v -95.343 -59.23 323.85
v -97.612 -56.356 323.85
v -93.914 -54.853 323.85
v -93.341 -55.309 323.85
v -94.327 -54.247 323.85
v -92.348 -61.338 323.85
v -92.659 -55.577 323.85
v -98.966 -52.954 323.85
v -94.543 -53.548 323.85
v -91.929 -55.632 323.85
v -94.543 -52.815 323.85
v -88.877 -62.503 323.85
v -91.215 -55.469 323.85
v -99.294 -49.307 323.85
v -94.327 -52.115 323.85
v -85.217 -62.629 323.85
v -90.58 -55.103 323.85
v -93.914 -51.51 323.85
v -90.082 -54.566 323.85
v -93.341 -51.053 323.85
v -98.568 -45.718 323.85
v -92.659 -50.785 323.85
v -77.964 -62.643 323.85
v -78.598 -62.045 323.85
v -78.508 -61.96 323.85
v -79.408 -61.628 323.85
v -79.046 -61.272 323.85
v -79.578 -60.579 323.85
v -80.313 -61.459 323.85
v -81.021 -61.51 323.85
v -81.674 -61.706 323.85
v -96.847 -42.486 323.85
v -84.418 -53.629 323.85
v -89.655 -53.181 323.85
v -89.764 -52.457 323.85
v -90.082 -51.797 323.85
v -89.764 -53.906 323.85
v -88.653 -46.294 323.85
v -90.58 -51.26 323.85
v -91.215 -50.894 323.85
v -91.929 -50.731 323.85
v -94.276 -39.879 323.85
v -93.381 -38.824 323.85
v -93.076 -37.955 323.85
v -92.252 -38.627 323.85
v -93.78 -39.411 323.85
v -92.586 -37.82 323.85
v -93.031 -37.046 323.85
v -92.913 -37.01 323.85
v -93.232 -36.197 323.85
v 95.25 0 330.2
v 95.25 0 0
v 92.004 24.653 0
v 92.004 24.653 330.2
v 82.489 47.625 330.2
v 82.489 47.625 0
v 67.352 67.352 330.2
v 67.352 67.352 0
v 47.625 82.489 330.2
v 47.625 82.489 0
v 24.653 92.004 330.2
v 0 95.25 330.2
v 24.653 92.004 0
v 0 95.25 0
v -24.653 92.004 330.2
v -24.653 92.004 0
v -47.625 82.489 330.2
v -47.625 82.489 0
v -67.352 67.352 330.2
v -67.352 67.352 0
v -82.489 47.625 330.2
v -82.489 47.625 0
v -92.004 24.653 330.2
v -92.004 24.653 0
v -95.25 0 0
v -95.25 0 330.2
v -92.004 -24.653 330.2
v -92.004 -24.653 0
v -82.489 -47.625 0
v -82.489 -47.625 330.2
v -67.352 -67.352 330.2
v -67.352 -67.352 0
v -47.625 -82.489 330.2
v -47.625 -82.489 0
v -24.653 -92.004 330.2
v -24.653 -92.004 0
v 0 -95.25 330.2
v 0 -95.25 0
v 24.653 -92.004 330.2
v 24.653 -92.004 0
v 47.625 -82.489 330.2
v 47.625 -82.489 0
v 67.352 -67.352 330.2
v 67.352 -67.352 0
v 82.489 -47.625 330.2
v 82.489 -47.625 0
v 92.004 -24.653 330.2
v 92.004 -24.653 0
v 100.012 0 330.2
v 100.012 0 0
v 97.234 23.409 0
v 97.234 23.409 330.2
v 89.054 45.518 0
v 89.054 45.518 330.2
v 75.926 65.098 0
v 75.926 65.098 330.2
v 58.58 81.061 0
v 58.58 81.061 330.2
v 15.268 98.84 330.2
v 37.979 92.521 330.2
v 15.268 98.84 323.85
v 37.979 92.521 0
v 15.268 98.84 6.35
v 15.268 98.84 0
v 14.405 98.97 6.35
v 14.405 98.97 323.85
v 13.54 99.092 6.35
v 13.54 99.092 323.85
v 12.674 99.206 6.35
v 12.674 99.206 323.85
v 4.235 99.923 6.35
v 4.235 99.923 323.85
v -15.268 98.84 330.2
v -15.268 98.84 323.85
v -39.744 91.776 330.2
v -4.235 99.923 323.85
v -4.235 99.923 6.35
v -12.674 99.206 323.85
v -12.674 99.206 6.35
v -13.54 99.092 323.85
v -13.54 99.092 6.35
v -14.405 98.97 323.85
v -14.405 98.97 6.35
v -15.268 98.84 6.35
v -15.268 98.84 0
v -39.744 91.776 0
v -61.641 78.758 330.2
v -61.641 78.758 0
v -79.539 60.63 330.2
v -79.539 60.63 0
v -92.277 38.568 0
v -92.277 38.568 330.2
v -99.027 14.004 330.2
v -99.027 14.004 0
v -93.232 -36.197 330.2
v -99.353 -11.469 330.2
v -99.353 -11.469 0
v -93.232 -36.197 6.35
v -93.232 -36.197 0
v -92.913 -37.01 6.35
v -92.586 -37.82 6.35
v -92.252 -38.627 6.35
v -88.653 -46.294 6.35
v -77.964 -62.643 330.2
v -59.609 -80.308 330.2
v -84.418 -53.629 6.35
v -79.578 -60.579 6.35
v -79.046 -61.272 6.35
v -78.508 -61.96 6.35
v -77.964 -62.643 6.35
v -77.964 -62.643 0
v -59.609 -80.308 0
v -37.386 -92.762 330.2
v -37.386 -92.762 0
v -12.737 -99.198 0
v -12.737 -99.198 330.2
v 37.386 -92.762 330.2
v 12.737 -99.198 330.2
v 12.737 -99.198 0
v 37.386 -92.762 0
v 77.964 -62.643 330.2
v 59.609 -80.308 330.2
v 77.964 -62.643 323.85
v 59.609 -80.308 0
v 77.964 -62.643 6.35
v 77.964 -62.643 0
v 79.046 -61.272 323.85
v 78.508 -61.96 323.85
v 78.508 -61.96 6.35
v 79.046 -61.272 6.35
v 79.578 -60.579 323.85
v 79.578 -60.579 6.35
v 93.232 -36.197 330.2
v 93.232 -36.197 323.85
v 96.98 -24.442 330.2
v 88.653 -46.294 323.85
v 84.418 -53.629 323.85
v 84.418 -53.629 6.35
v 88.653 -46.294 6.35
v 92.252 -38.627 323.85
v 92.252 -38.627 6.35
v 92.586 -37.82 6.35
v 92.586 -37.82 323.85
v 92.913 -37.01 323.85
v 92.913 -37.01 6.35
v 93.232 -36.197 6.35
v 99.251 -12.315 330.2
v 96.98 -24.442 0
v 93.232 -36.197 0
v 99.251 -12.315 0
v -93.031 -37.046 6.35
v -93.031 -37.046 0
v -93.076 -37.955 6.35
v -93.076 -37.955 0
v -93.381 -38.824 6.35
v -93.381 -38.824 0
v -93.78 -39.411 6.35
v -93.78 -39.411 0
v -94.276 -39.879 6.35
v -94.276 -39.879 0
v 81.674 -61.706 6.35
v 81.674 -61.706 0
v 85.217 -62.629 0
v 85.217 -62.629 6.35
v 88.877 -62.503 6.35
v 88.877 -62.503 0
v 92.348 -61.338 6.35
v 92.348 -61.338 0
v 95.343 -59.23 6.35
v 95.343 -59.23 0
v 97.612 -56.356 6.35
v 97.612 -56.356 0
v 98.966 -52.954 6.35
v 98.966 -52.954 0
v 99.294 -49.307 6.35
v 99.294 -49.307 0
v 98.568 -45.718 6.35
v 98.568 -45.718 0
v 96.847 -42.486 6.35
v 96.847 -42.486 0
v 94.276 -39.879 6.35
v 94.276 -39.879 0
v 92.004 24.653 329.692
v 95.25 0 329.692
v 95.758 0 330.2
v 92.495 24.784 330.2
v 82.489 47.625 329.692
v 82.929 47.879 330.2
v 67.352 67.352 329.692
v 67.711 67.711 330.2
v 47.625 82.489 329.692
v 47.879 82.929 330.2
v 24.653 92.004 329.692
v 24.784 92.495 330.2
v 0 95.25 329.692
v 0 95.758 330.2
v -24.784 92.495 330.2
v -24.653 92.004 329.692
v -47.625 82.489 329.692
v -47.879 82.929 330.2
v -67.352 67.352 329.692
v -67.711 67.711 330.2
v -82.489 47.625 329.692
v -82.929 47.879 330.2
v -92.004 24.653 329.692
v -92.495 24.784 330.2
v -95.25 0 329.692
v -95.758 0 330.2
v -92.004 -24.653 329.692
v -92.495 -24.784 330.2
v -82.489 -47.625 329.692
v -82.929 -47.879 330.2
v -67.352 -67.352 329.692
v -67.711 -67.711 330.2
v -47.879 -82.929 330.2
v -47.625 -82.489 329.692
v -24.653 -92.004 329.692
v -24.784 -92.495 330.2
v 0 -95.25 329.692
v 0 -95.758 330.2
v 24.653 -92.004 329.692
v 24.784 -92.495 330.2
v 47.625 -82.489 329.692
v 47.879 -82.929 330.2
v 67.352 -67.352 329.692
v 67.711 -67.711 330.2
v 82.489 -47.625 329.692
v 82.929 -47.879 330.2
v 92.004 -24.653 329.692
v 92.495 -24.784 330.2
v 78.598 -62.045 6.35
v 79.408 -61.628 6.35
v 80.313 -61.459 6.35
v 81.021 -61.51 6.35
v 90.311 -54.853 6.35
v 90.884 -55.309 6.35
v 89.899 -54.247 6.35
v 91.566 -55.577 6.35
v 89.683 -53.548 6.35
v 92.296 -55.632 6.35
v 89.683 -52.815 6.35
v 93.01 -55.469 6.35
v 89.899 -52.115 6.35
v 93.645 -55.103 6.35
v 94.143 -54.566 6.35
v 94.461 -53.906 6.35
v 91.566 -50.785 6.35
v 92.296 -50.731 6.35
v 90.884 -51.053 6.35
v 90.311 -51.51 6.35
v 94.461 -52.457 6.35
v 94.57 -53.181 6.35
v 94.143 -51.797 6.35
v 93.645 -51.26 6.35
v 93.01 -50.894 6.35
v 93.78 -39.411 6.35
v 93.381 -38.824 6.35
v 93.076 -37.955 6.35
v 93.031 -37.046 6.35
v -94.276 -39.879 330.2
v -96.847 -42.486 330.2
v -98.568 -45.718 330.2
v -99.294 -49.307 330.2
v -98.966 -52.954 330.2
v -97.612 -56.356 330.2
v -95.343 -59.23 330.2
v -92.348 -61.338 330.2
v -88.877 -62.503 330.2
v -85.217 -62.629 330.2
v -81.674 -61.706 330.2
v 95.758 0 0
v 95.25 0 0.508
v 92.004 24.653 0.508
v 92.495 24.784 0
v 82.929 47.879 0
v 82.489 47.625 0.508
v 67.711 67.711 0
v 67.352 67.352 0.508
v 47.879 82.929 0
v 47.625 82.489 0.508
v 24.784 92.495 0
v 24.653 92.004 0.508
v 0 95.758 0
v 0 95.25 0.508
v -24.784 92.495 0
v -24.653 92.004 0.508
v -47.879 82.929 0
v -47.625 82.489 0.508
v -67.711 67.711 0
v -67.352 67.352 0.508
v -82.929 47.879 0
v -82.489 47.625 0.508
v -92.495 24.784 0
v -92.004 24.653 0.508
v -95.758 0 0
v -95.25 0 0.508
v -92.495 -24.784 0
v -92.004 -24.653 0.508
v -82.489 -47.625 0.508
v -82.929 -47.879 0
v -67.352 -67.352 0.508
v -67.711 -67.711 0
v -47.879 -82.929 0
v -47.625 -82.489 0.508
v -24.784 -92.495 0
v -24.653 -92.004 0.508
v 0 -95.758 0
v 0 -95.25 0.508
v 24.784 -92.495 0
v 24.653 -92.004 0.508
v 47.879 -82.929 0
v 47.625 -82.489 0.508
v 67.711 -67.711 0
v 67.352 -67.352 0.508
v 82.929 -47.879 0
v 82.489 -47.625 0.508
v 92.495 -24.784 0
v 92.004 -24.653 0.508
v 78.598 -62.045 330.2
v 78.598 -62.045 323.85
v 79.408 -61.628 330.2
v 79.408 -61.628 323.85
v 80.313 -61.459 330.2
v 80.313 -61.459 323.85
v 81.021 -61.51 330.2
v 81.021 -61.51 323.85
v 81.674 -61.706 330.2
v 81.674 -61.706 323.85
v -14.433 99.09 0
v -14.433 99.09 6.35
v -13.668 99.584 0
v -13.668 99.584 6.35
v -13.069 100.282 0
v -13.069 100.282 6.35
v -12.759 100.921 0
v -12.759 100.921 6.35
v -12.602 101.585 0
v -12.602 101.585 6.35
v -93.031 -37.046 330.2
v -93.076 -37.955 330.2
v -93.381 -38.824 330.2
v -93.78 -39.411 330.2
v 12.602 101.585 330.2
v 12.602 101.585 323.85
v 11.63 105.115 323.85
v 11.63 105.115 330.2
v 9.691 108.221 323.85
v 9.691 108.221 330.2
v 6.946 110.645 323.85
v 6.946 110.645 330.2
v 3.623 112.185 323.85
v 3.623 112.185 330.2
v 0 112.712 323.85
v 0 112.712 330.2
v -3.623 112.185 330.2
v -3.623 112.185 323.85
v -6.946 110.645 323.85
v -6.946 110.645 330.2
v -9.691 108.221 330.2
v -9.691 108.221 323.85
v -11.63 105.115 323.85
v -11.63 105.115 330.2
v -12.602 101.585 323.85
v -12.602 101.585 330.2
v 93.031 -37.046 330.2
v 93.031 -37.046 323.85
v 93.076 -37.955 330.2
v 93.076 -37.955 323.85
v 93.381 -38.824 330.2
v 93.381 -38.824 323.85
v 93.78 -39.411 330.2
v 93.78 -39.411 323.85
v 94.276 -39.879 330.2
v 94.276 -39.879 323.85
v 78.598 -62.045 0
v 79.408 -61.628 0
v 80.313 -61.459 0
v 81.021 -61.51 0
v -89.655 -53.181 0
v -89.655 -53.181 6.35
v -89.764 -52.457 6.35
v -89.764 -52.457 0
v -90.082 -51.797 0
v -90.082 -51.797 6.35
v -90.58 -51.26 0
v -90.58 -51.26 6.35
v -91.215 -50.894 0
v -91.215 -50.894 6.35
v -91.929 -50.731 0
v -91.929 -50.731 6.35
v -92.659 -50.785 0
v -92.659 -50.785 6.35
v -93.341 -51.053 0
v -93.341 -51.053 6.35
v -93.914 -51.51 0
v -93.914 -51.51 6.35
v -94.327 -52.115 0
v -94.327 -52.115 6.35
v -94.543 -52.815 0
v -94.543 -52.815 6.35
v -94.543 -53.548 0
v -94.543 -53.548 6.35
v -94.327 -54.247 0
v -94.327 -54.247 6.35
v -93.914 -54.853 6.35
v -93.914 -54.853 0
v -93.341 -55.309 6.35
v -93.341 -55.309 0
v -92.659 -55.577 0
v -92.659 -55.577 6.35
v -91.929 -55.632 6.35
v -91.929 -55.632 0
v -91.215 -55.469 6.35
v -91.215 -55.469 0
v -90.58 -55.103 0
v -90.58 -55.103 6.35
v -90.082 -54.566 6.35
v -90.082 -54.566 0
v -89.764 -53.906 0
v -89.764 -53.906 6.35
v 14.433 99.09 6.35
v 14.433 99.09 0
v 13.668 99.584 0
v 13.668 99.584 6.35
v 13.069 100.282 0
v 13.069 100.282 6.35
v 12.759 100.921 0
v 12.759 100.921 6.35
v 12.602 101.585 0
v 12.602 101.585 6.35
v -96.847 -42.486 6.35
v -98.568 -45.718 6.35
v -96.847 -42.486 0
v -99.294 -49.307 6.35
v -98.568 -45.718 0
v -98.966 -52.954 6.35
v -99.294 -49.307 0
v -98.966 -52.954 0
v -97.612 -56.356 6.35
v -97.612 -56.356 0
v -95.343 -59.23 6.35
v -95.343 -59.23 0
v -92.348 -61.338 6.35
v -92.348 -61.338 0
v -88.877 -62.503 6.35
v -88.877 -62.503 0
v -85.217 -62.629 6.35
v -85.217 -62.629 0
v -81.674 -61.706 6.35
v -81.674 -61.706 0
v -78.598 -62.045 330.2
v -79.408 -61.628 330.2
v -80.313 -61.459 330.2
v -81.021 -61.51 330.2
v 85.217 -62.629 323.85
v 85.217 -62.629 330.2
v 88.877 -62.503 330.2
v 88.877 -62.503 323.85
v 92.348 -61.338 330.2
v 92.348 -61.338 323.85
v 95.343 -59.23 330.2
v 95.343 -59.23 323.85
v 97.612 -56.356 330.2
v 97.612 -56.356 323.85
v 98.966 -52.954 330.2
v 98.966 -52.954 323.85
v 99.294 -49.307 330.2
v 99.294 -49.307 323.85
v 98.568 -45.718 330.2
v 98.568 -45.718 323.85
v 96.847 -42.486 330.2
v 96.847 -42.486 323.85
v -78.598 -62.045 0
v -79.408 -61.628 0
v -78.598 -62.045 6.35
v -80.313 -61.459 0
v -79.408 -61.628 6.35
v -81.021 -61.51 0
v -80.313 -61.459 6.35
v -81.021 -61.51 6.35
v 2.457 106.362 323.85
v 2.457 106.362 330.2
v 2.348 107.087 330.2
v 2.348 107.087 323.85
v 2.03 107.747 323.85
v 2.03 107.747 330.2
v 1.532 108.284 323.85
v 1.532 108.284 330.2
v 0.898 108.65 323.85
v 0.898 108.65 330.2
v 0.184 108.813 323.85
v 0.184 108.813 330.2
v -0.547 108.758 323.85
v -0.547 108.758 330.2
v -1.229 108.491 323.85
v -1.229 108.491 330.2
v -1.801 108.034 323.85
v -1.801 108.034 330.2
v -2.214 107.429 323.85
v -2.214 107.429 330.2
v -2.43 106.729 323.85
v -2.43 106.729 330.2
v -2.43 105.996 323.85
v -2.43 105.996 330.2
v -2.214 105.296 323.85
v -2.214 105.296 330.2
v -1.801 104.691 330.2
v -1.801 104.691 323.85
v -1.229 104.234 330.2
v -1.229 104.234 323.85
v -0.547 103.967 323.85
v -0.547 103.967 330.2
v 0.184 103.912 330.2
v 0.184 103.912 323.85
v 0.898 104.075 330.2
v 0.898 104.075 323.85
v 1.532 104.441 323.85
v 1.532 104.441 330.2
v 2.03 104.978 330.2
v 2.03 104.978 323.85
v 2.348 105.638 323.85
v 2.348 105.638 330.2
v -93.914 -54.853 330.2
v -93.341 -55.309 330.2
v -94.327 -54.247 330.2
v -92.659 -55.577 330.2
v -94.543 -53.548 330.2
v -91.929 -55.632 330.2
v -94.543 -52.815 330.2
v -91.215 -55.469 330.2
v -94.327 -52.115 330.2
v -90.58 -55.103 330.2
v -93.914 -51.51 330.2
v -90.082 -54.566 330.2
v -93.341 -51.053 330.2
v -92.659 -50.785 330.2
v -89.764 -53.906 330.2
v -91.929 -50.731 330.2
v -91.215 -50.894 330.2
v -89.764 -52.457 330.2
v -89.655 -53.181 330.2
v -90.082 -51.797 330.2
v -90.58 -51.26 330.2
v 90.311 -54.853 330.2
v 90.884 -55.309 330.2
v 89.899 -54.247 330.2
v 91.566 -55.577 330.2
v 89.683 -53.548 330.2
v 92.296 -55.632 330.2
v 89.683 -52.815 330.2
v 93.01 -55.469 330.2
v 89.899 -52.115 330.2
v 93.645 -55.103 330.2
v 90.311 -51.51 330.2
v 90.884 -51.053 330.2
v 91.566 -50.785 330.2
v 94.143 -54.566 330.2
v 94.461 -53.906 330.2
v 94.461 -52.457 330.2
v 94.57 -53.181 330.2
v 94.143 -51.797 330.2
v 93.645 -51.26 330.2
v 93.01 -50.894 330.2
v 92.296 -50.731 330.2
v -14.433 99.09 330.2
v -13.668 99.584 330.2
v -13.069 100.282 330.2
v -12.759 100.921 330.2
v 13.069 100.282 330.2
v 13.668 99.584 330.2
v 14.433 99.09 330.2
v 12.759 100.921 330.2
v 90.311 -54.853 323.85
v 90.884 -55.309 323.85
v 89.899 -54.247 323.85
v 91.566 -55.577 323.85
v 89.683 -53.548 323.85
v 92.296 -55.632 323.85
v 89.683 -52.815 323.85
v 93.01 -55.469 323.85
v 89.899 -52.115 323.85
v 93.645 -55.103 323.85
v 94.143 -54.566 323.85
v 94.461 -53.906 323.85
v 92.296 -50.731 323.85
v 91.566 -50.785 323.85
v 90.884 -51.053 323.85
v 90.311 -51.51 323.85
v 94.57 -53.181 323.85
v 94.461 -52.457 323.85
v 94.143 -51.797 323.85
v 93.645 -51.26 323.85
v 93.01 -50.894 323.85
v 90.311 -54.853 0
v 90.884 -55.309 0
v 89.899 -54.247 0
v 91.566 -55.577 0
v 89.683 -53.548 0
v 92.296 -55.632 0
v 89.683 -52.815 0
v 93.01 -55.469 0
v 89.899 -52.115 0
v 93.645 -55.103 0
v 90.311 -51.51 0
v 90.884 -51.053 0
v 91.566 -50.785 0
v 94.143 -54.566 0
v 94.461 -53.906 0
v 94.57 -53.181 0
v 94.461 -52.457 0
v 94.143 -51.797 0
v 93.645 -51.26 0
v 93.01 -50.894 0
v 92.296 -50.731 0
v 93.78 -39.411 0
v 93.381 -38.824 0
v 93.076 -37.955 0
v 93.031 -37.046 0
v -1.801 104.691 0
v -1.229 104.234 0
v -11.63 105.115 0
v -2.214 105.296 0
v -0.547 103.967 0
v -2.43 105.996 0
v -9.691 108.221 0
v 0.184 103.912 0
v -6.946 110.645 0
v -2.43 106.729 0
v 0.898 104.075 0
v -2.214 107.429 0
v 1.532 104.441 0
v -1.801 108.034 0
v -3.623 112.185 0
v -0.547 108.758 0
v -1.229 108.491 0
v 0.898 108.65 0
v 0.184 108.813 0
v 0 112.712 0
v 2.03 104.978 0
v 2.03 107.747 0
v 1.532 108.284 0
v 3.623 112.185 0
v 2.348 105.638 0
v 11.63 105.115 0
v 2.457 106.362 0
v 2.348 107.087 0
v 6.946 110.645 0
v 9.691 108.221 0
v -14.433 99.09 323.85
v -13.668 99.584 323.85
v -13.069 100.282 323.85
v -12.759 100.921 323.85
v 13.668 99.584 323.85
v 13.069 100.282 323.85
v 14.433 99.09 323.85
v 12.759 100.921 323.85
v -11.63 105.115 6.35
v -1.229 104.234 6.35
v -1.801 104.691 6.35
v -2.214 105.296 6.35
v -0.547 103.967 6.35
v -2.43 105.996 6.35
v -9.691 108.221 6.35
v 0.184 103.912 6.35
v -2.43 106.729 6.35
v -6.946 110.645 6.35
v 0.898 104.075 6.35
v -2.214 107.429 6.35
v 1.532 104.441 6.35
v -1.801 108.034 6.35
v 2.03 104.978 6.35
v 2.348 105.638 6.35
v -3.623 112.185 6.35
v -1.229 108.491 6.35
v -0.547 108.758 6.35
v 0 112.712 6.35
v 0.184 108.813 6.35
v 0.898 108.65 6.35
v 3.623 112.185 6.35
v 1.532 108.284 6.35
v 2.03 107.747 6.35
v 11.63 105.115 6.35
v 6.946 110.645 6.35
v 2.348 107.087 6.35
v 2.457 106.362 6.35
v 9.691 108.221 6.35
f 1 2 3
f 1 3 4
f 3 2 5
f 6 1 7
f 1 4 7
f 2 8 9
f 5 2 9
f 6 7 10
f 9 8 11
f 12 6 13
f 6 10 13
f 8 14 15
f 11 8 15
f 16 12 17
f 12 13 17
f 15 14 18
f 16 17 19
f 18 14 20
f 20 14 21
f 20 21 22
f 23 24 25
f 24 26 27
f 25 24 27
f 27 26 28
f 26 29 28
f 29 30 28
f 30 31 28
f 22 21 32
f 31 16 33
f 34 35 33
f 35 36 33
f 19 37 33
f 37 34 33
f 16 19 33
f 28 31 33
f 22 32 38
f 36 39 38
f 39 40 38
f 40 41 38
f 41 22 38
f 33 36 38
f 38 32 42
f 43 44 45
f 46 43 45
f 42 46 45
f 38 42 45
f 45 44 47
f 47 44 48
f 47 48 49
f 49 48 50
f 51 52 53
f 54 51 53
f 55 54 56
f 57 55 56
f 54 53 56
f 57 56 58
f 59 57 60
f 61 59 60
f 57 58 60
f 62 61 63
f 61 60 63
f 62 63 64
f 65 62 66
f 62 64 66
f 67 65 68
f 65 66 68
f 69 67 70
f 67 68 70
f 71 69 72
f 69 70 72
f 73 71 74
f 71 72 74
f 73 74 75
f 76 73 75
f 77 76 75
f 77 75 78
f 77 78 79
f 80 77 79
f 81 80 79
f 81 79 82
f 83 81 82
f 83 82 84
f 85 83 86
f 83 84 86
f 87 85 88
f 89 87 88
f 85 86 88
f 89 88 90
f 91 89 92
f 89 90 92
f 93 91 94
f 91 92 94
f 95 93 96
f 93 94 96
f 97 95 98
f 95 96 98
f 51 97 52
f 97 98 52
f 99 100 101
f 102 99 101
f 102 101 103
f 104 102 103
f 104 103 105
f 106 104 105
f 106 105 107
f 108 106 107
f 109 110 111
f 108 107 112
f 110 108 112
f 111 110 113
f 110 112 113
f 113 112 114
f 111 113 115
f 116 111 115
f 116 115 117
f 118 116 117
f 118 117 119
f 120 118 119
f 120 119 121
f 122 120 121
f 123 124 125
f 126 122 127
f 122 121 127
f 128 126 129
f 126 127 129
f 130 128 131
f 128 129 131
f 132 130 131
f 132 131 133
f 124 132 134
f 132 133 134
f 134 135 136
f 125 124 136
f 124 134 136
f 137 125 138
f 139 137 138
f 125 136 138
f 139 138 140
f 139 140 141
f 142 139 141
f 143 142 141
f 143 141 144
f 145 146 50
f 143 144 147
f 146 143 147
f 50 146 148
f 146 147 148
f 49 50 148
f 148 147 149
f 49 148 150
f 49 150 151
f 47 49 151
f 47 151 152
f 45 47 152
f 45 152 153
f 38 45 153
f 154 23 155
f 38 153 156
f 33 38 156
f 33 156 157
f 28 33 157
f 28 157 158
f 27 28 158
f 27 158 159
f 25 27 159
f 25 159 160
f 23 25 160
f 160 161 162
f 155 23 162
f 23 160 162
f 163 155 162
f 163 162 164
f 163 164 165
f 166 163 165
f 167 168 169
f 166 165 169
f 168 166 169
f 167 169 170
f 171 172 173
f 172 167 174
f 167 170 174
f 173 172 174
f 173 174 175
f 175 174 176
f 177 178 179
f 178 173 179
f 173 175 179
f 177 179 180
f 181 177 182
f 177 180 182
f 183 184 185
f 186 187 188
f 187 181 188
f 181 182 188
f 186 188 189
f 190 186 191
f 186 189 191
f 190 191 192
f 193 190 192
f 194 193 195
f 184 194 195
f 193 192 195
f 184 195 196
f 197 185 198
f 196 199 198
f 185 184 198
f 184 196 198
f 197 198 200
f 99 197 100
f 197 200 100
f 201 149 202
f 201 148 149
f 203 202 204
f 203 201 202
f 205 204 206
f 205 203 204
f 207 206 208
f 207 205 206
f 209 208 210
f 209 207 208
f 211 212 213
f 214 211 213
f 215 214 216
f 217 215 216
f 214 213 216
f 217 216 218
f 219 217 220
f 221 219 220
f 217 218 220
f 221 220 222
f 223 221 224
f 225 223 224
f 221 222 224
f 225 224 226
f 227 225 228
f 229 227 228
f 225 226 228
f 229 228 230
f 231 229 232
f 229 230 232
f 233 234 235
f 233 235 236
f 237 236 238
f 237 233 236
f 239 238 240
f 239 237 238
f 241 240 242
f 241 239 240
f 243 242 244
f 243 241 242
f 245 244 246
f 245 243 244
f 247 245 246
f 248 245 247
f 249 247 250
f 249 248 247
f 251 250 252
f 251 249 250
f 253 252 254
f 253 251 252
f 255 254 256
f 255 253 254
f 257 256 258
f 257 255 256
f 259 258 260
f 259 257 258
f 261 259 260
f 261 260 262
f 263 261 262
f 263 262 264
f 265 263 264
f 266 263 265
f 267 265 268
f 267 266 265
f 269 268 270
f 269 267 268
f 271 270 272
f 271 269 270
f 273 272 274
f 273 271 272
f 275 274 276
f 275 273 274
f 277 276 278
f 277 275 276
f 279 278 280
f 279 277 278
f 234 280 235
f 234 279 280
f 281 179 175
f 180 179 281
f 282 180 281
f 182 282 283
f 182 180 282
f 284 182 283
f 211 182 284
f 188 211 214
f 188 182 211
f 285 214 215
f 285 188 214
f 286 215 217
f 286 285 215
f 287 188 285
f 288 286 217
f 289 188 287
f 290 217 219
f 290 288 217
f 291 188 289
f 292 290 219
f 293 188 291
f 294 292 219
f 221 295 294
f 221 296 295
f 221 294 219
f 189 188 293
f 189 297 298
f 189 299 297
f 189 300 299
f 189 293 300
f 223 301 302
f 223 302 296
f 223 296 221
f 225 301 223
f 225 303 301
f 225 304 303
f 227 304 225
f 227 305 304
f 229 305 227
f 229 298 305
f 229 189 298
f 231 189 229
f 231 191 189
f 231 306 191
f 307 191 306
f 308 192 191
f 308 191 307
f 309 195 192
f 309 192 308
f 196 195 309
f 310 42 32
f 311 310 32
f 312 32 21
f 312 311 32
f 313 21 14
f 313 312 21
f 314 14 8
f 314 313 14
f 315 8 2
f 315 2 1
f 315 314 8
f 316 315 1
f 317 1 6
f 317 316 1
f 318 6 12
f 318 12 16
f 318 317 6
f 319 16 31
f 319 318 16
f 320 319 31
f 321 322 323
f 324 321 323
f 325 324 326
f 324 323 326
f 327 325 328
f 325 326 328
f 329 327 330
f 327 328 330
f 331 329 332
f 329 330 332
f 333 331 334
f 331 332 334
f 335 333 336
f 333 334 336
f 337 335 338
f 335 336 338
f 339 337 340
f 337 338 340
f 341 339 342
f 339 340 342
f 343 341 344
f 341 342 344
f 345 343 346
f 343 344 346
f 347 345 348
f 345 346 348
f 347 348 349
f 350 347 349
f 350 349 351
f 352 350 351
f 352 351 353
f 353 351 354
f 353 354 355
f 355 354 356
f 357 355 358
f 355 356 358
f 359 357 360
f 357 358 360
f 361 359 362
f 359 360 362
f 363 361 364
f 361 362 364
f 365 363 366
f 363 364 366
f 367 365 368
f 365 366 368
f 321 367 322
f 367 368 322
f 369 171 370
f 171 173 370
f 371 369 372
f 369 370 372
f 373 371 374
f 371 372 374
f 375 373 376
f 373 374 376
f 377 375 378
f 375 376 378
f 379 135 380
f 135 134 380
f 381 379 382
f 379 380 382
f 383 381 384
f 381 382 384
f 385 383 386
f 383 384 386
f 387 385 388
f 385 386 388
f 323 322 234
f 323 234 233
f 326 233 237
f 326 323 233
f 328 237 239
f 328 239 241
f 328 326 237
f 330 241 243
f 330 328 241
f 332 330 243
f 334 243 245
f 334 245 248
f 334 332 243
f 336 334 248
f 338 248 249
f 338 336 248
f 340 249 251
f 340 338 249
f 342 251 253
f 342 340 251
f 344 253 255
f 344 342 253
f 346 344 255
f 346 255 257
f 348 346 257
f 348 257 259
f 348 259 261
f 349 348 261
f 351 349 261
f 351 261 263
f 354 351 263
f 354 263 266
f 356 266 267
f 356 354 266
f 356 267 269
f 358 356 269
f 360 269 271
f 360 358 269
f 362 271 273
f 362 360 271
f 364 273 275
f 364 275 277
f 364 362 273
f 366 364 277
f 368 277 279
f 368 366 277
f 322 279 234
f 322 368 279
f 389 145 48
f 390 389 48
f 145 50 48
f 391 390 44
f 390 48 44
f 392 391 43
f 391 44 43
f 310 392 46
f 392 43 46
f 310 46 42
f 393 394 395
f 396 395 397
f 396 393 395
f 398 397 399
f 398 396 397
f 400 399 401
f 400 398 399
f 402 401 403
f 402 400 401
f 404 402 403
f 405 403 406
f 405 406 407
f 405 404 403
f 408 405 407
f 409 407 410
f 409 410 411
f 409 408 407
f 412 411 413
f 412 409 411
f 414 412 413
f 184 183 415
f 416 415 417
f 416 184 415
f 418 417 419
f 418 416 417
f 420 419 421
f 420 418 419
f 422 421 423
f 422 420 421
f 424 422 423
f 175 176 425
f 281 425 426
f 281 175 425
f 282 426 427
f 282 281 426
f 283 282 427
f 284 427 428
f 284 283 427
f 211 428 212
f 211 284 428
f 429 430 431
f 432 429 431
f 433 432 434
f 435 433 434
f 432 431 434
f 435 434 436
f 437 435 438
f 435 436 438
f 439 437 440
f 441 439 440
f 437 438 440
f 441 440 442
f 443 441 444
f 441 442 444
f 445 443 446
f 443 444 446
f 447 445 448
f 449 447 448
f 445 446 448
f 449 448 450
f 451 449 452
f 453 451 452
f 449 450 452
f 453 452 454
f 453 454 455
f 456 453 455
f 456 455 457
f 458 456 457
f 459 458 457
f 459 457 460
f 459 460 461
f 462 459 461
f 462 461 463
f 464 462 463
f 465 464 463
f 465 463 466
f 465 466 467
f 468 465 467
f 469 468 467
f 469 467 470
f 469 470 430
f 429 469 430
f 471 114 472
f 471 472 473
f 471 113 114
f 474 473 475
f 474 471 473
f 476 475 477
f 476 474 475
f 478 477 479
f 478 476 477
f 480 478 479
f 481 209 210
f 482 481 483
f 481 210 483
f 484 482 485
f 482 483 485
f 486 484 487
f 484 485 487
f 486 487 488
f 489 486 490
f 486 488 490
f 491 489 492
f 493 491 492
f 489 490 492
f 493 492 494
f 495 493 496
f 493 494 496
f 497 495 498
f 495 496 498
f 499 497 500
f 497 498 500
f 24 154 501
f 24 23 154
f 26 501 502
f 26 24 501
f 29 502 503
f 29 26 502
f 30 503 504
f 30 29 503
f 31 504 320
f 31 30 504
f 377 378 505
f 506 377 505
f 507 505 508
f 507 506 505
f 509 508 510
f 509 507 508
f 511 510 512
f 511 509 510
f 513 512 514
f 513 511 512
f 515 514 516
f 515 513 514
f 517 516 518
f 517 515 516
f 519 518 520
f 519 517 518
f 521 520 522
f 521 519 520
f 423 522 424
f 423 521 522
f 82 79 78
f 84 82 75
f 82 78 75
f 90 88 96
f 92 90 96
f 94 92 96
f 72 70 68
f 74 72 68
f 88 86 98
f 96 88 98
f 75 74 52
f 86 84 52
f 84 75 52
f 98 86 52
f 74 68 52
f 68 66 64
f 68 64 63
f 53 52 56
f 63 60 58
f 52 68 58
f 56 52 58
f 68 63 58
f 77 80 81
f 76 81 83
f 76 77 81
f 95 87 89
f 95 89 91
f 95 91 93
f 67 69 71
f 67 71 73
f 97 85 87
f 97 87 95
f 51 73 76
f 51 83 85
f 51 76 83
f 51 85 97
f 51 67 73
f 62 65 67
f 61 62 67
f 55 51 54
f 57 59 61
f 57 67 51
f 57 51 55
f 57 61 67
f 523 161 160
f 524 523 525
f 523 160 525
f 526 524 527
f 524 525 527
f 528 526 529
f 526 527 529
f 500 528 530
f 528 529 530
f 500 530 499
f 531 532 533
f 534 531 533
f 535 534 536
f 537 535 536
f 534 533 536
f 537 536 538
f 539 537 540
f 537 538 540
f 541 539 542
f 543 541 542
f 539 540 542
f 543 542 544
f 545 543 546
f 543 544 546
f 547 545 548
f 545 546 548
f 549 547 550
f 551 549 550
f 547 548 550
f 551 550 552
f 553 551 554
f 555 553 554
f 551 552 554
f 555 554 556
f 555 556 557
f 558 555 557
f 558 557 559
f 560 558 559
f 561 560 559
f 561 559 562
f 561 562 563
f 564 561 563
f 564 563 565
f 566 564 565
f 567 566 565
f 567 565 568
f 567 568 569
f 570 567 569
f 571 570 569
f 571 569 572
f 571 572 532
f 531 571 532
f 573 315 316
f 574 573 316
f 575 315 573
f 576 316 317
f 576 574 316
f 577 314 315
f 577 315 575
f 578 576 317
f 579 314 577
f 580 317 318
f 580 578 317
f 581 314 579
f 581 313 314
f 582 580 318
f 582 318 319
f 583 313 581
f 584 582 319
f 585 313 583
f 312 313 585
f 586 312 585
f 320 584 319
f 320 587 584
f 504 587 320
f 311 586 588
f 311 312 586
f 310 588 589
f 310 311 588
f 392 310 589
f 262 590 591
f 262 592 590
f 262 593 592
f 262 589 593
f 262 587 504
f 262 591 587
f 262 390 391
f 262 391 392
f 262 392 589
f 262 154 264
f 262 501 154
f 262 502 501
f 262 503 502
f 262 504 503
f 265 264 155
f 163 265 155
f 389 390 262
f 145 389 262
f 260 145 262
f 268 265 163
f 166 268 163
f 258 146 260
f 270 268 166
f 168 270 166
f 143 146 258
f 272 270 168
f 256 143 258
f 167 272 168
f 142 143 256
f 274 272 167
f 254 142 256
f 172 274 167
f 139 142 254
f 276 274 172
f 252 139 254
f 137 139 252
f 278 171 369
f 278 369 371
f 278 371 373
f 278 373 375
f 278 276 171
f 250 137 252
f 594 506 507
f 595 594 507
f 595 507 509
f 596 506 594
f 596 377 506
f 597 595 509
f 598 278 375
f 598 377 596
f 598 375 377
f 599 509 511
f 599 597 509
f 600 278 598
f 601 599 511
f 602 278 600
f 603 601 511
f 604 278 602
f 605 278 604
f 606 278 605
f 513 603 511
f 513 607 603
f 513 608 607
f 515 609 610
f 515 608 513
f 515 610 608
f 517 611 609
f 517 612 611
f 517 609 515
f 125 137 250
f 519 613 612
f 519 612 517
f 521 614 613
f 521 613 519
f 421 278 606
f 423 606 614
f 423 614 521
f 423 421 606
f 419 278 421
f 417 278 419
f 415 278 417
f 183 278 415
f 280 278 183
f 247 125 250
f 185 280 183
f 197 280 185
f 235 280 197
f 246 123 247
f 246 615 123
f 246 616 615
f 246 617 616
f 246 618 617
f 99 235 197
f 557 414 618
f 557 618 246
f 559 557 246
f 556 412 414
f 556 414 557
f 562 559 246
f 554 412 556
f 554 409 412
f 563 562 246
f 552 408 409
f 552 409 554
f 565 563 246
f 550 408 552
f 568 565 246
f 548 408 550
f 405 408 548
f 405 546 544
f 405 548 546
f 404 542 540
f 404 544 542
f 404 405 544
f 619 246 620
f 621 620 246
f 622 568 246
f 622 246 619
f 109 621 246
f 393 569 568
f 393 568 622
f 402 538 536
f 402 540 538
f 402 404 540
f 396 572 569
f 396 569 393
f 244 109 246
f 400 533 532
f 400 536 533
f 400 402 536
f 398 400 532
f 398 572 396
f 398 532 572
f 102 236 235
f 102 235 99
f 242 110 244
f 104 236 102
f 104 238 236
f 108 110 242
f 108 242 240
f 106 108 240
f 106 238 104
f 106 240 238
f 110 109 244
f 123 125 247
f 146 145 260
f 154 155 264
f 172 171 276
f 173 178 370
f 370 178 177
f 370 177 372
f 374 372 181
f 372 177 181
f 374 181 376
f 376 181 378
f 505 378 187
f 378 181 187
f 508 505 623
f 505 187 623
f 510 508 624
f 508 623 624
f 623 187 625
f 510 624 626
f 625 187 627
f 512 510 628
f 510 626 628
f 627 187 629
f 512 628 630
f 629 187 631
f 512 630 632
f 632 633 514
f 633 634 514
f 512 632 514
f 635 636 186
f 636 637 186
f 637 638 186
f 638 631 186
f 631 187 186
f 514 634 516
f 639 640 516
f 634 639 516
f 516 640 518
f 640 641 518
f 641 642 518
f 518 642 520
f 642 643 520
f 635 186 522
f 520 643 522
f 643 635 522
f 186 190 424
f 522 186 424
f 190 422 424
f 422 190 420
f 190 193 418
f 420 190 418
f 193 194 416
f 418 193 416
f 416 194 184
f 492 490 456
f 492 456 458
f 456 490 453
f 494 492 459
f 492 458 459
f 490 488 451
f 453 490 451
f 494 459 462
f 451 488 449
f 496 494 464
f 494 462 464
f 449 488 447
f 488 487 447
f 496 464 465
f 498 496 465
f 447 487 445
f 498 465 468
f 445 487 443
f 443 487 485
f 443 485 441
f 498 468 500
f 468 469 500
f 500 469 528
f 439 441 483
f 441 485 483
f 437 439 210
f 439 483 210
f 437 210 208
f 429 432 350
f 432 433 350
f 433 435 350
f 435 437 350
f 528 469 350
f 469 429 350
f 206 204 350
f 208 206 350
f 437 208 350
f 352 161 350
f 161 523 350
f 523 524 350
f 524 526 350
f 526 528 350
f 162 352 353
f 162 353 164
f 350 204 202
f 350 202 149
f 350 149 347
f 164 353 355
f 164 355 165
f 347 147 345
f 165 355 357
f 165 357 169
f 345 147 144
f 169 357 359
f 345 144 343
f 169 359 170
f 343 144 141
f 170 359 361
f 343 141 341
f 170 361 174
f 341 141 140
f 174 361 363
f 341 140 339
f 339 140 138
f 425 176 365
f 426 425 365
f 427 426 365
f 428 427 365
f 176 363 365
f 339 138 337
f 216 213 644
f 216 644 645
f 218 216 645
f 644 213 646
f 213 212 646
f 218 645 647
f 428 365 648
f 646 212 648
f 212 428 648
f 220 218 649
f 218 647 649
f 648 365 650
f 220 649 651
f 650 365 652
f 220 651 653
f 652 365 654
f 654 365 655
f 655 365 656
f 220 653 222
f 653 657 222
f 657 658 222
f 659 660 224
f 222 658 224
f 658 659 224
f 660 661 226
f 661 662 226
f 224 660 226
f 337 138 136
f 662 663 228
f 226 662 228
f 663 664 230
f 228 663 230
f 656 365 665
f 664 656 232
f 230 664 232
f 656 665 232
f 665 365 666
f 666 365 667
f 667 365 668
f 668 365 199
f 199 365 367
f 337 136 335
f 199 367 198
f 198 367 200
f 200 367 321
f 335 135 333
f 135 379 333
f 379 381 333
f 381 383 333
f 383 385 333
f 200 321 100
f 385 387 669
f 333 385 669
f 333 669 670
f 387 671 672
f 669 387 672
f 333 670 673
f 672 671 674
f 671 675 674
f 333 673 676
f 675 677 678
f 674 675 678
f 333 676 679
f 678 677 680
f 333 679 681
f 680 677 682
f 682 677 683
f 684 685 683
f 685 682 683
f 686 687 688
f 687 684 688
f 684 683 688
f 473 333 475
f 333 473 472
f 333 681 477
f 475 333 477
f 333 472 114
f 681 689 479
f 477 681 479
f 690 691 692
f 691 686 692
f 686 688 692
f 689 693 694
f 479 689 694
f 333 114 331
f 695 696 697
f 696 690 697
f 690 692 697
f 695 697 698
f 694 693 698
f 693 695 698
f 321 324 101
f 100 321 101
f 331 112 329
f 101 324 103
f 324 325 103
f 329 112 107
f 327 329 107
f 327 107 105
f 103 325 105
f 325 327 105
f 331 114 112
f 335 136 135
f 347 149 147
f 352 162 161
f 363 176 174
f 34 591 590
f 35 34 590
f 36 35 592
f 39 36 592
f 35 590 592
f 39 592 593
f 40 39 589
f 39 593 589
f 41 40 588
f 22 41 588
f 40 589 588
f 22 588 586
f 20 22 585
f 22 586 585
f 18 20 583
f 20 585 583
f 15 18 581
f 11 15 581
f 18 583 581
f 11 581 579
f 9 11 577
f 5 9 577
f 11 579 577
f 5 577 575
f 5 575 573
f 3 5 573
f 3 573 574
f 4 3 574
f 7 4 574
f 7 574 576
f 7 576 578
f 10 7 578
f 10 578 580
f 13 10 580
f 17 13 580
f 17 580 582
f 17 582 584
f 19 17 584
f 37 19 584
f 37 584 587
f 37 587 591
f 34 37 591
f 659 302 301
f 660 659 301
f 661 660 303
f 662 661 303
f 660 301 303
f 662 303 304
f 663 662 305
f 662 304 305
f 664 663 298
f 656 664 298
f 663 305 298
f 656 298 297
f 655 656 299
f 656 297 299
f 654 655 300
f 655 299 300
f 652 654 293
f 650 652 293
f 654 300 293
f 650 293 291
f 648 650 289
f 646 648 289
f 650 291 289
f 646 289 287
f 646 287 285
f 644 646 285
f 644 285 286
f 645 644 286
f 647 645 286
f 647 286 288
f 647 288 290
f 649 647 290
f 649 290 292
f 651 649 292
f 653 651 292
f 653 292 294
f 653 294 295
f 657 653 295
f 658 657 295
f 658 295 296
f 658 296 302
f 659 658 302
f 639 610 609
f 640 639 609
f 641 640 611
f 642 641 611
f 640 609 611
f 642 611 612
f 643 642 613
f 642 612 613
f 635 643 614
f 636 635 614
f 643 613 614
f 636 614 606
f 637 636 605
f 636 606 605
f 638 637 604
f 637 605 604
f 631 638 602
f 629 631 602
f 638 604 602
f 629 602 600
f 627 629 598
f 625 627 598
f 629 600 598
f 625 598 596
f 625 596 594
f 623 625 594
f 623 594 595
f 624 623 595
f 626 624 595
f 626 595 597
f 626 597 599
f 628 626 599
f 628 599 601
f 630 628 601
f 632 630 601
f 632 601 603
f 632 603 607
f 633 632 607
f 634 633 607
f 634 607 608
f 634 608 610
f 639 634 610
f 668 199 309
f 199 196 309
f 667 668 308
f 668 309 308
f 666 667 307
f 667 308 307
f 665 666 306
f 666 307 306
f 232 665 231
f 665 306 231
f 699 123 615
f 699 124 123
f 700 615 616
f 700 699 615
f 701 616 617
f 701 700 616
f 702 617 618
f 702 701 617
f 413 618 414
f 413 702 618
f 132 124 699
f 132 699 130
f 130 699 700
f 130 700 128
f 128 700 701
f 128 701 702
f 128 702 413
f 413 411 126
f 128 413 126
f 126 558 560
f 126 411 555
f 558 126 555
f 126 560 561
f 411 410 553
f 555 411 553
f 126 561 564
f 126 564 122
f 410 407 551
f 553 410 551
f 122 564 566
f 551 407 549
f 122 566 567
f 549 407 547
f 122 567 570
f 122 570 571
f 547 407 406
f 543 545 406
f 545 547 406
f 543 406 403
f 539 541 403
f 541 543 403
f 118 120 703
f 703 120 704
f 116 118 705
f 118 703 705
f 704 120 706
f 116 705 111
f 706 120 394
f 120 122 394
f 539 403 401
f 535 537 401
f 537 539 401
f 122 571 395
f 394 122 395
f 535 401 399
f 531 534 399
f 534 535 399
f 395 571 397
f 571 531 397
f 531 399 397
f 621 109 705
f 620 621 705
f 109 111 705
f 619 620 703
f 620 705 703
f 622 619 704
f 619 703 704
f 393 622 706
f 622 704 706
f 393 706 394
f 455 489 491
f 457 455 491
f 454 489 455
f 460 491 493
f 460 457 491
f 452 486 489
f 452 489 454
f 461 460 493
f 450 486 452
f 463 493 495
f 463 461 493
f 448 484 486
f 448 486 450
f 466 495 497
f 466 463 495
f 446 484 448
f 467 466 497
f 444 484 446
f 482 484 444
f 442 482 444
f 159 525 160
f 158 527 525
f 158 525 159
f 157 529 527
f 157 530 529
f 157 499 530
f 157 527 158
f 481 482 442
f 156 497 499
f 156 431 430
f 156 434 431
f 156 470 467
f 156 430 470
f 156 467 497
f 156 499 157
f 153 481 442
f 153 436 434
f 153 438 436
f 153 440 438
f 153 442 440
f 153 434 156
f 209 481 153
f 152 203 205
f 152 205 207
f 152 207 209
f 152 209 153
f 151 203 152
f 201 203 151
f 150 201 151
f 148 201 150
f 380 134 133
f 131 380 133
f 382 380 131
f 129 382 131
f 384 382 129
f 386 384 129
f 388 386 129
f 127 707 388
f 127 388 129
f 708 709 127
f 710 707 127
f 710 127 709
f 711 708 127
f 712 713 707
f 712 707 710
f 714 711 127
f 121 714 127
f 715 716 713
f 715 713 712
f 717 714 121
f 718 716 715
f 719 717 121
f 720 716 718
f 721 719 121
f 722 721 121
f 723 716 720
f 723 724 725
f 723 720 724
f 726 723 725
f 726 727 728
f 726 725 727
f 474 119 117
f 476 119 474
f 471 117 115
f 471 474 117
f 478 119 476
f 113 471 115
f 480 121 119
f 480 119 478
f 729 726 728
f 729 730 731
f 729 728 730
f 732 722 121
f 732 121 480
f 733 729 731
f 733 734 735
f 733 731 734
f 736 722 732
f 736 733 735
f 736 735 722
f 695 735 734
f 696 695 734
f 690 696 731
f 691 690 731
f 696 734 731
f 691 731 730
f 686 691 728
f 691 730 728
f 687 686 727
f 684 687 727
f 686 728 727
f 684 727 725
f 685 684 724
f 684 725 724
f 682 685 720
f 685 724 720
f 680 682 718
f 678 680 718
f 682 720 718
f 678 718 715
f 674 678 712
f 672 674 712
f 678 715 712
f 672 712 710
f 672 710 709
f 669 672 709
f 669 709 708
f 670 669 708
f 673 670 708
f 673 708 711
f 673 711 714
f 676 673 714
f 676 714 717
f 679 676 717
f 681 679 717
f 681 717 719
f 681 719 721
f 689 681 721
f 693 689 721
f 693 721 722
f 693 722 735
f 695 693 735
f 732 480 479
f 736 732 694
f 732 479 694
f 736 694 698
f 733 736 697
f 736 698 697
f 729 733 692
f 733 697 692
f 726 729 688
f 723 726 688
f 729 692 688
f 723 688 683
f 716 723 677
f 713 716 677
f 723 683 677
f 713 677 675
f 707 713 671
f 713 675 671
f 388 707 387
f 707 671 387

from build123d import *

# Parameters (mm, degrees)
SKETCH1_R                    = 100.0125
SKETCH1_R_2                  = 95.25
EXTRUDE1_DEPTH               = 330.2
EXTRUDE2_DEPTH               = 6.35
EXTRUDE4_DEPTH               = 6.35
F_10_0_1935_DIAMETER_HOLE1_D = 4.9149
CHAMFER1_SIZE                = 0.508
FILLET1_R                    = 3.175
SKETCH1_3_R                  = 95.25
BOSS_EXTRUDE1_DEPTH          = 330.2


with BuildPart() as part:
    # Sketch1 → Extrude1 (new body)
    with BuildSketch(Plane.XY):
        Circle(SKETCH1_R)
        Circle(SKETCH1_R_2, mode=Mode.SUBTRACT)
    extrude(amount=EXTRUDE1_DEPTH)

    # Sketch2 → Extrude2 (add)
    with BuildSketch(Plane.XY):
        with BuildLine():
            ThreePointArc((-12.674375762, 99.206150794), (0, 100.0125), (12.674375762, 99.206150794))
            ThreePointArc((12.674375762, 99.206150794), (0, 112.7125), (-12.674375762, 99.206150794))
        make_face()
        with BuildLine():
            ThreePointArc((-79.577858918, -60.579406784), (-86.613365696, -50.00625), (-92.25223468, -38.62674401))
            ThreePointArc((-92.25223468, -38.62674401), (-97.611888324, -56.35625), (-79.577858918, -60.579406784))
        make_face()
        with BuildLine():
            ThreePointArc((79.577858918, -60.579406784), (97.611888324, -56.35625), (92.25223468, -38.62674401))
            ThreePointArc((92.25223468, -38.62674401), (86.613365696, -50.00625), (79.577858918, -60.579406784))
        make_face()
    extrude(amount=EXTRUDE2_DEPTH)

    # Sketch3 → Extrude4 (add)
    with BuildSketch(Plane.XY.offset(330.2)):
        with BuildLine():
            ThreePointArc((12.674375762, 99.206150794), (0, 112.7125), (-12.674375762, 99.206150794))
            ThreePointArc((-12.674375762, 99.206150794), (0, 100.0125), (12.674375762, 99.206150794))
        make_face()
        with BuildLine():
            ThreePointArc((92.25223468, -38.62674401), (86.613365696, -50.00625), (79.577858918, -60.579406784))
            ThreePointArc((79.577858918, -60.579406784), (97.611888324, -56.35625), (92.25223468, -38.62674401))
        make_face()
        with BuildLine():
            ThreePointArc((-92.25223468, -38.62674401), (-97.611888324, -56.35625), (-79.577858918, -60.579406784))
            ThreePointArc((-79.577858918, -60.579406784), (-86.613365696, -50.00625), (-92.25223468, -38.62674401))
        make_face()
    extrude(amount=-EXTRUDE4_DEPTH)

    # 10 _0.1935_ Diameter Hole1 (through all)
    with Locations(Plane(origin=(0, 106.3625, 0), x_dir=(-1, 0, 0), z_dir=(0, 0, -1))):
        with Locations((0, 0), (-92.11262701, -159.54375), (92.11262701, -159.54375)):
            Hole(F_10_0_1935_DIAMETER_HOLE1_D / 2)

    # Chamfer1
    chamfer1_edges = [part.edges().sort_by_distance(p)[0] for p in [
        (-95.25, 0, 0),
        (-95.25, 0, 330.2),
    ]]
    chamfer(chamfer1_edges, length=CHAMFER1_SIZE)

    # Fillet1
    fillet1_edges = [part.edges().sort_by_distance(p)[0] for p in [
        (79.577858918, -60.579406784, 3.175),
        (92.25223468, -38.62674401, 3.175),
        (-12.674375762, 99.206150794, 3.175),
        (12.674375762, 99.206150794, 3.175),
        (-92.25223468, -38.62674401, 3.175),
        (-79.577858918, -60.579406784, 3.175),
        (-79.577858918, -60.579406784, 327.025),
        (-92.25223468, -38.62674401, 327.025),
        (-12.674375762, 99.206150794, 327.025),
        (12.674375762, 99.206150794, 327.025),
        (92.25223468, -38.62674401, 327.025),
        (79.577858918, -60.579406784, 327.025),
    ]]
    fillet(fillet1_edges, radius=FILLET1_R)


with BuildPart() as body_2:
    # Sketch1_3 → Boss-Extrude1 (new body)
    with BuildSketch(Plane.XY):
        Circle(SKETCH1_3_R)
    extrude(amount=BOSS_EXTRUDE1_DEPTH)


solid = Compound([part.part, body_2.part])
